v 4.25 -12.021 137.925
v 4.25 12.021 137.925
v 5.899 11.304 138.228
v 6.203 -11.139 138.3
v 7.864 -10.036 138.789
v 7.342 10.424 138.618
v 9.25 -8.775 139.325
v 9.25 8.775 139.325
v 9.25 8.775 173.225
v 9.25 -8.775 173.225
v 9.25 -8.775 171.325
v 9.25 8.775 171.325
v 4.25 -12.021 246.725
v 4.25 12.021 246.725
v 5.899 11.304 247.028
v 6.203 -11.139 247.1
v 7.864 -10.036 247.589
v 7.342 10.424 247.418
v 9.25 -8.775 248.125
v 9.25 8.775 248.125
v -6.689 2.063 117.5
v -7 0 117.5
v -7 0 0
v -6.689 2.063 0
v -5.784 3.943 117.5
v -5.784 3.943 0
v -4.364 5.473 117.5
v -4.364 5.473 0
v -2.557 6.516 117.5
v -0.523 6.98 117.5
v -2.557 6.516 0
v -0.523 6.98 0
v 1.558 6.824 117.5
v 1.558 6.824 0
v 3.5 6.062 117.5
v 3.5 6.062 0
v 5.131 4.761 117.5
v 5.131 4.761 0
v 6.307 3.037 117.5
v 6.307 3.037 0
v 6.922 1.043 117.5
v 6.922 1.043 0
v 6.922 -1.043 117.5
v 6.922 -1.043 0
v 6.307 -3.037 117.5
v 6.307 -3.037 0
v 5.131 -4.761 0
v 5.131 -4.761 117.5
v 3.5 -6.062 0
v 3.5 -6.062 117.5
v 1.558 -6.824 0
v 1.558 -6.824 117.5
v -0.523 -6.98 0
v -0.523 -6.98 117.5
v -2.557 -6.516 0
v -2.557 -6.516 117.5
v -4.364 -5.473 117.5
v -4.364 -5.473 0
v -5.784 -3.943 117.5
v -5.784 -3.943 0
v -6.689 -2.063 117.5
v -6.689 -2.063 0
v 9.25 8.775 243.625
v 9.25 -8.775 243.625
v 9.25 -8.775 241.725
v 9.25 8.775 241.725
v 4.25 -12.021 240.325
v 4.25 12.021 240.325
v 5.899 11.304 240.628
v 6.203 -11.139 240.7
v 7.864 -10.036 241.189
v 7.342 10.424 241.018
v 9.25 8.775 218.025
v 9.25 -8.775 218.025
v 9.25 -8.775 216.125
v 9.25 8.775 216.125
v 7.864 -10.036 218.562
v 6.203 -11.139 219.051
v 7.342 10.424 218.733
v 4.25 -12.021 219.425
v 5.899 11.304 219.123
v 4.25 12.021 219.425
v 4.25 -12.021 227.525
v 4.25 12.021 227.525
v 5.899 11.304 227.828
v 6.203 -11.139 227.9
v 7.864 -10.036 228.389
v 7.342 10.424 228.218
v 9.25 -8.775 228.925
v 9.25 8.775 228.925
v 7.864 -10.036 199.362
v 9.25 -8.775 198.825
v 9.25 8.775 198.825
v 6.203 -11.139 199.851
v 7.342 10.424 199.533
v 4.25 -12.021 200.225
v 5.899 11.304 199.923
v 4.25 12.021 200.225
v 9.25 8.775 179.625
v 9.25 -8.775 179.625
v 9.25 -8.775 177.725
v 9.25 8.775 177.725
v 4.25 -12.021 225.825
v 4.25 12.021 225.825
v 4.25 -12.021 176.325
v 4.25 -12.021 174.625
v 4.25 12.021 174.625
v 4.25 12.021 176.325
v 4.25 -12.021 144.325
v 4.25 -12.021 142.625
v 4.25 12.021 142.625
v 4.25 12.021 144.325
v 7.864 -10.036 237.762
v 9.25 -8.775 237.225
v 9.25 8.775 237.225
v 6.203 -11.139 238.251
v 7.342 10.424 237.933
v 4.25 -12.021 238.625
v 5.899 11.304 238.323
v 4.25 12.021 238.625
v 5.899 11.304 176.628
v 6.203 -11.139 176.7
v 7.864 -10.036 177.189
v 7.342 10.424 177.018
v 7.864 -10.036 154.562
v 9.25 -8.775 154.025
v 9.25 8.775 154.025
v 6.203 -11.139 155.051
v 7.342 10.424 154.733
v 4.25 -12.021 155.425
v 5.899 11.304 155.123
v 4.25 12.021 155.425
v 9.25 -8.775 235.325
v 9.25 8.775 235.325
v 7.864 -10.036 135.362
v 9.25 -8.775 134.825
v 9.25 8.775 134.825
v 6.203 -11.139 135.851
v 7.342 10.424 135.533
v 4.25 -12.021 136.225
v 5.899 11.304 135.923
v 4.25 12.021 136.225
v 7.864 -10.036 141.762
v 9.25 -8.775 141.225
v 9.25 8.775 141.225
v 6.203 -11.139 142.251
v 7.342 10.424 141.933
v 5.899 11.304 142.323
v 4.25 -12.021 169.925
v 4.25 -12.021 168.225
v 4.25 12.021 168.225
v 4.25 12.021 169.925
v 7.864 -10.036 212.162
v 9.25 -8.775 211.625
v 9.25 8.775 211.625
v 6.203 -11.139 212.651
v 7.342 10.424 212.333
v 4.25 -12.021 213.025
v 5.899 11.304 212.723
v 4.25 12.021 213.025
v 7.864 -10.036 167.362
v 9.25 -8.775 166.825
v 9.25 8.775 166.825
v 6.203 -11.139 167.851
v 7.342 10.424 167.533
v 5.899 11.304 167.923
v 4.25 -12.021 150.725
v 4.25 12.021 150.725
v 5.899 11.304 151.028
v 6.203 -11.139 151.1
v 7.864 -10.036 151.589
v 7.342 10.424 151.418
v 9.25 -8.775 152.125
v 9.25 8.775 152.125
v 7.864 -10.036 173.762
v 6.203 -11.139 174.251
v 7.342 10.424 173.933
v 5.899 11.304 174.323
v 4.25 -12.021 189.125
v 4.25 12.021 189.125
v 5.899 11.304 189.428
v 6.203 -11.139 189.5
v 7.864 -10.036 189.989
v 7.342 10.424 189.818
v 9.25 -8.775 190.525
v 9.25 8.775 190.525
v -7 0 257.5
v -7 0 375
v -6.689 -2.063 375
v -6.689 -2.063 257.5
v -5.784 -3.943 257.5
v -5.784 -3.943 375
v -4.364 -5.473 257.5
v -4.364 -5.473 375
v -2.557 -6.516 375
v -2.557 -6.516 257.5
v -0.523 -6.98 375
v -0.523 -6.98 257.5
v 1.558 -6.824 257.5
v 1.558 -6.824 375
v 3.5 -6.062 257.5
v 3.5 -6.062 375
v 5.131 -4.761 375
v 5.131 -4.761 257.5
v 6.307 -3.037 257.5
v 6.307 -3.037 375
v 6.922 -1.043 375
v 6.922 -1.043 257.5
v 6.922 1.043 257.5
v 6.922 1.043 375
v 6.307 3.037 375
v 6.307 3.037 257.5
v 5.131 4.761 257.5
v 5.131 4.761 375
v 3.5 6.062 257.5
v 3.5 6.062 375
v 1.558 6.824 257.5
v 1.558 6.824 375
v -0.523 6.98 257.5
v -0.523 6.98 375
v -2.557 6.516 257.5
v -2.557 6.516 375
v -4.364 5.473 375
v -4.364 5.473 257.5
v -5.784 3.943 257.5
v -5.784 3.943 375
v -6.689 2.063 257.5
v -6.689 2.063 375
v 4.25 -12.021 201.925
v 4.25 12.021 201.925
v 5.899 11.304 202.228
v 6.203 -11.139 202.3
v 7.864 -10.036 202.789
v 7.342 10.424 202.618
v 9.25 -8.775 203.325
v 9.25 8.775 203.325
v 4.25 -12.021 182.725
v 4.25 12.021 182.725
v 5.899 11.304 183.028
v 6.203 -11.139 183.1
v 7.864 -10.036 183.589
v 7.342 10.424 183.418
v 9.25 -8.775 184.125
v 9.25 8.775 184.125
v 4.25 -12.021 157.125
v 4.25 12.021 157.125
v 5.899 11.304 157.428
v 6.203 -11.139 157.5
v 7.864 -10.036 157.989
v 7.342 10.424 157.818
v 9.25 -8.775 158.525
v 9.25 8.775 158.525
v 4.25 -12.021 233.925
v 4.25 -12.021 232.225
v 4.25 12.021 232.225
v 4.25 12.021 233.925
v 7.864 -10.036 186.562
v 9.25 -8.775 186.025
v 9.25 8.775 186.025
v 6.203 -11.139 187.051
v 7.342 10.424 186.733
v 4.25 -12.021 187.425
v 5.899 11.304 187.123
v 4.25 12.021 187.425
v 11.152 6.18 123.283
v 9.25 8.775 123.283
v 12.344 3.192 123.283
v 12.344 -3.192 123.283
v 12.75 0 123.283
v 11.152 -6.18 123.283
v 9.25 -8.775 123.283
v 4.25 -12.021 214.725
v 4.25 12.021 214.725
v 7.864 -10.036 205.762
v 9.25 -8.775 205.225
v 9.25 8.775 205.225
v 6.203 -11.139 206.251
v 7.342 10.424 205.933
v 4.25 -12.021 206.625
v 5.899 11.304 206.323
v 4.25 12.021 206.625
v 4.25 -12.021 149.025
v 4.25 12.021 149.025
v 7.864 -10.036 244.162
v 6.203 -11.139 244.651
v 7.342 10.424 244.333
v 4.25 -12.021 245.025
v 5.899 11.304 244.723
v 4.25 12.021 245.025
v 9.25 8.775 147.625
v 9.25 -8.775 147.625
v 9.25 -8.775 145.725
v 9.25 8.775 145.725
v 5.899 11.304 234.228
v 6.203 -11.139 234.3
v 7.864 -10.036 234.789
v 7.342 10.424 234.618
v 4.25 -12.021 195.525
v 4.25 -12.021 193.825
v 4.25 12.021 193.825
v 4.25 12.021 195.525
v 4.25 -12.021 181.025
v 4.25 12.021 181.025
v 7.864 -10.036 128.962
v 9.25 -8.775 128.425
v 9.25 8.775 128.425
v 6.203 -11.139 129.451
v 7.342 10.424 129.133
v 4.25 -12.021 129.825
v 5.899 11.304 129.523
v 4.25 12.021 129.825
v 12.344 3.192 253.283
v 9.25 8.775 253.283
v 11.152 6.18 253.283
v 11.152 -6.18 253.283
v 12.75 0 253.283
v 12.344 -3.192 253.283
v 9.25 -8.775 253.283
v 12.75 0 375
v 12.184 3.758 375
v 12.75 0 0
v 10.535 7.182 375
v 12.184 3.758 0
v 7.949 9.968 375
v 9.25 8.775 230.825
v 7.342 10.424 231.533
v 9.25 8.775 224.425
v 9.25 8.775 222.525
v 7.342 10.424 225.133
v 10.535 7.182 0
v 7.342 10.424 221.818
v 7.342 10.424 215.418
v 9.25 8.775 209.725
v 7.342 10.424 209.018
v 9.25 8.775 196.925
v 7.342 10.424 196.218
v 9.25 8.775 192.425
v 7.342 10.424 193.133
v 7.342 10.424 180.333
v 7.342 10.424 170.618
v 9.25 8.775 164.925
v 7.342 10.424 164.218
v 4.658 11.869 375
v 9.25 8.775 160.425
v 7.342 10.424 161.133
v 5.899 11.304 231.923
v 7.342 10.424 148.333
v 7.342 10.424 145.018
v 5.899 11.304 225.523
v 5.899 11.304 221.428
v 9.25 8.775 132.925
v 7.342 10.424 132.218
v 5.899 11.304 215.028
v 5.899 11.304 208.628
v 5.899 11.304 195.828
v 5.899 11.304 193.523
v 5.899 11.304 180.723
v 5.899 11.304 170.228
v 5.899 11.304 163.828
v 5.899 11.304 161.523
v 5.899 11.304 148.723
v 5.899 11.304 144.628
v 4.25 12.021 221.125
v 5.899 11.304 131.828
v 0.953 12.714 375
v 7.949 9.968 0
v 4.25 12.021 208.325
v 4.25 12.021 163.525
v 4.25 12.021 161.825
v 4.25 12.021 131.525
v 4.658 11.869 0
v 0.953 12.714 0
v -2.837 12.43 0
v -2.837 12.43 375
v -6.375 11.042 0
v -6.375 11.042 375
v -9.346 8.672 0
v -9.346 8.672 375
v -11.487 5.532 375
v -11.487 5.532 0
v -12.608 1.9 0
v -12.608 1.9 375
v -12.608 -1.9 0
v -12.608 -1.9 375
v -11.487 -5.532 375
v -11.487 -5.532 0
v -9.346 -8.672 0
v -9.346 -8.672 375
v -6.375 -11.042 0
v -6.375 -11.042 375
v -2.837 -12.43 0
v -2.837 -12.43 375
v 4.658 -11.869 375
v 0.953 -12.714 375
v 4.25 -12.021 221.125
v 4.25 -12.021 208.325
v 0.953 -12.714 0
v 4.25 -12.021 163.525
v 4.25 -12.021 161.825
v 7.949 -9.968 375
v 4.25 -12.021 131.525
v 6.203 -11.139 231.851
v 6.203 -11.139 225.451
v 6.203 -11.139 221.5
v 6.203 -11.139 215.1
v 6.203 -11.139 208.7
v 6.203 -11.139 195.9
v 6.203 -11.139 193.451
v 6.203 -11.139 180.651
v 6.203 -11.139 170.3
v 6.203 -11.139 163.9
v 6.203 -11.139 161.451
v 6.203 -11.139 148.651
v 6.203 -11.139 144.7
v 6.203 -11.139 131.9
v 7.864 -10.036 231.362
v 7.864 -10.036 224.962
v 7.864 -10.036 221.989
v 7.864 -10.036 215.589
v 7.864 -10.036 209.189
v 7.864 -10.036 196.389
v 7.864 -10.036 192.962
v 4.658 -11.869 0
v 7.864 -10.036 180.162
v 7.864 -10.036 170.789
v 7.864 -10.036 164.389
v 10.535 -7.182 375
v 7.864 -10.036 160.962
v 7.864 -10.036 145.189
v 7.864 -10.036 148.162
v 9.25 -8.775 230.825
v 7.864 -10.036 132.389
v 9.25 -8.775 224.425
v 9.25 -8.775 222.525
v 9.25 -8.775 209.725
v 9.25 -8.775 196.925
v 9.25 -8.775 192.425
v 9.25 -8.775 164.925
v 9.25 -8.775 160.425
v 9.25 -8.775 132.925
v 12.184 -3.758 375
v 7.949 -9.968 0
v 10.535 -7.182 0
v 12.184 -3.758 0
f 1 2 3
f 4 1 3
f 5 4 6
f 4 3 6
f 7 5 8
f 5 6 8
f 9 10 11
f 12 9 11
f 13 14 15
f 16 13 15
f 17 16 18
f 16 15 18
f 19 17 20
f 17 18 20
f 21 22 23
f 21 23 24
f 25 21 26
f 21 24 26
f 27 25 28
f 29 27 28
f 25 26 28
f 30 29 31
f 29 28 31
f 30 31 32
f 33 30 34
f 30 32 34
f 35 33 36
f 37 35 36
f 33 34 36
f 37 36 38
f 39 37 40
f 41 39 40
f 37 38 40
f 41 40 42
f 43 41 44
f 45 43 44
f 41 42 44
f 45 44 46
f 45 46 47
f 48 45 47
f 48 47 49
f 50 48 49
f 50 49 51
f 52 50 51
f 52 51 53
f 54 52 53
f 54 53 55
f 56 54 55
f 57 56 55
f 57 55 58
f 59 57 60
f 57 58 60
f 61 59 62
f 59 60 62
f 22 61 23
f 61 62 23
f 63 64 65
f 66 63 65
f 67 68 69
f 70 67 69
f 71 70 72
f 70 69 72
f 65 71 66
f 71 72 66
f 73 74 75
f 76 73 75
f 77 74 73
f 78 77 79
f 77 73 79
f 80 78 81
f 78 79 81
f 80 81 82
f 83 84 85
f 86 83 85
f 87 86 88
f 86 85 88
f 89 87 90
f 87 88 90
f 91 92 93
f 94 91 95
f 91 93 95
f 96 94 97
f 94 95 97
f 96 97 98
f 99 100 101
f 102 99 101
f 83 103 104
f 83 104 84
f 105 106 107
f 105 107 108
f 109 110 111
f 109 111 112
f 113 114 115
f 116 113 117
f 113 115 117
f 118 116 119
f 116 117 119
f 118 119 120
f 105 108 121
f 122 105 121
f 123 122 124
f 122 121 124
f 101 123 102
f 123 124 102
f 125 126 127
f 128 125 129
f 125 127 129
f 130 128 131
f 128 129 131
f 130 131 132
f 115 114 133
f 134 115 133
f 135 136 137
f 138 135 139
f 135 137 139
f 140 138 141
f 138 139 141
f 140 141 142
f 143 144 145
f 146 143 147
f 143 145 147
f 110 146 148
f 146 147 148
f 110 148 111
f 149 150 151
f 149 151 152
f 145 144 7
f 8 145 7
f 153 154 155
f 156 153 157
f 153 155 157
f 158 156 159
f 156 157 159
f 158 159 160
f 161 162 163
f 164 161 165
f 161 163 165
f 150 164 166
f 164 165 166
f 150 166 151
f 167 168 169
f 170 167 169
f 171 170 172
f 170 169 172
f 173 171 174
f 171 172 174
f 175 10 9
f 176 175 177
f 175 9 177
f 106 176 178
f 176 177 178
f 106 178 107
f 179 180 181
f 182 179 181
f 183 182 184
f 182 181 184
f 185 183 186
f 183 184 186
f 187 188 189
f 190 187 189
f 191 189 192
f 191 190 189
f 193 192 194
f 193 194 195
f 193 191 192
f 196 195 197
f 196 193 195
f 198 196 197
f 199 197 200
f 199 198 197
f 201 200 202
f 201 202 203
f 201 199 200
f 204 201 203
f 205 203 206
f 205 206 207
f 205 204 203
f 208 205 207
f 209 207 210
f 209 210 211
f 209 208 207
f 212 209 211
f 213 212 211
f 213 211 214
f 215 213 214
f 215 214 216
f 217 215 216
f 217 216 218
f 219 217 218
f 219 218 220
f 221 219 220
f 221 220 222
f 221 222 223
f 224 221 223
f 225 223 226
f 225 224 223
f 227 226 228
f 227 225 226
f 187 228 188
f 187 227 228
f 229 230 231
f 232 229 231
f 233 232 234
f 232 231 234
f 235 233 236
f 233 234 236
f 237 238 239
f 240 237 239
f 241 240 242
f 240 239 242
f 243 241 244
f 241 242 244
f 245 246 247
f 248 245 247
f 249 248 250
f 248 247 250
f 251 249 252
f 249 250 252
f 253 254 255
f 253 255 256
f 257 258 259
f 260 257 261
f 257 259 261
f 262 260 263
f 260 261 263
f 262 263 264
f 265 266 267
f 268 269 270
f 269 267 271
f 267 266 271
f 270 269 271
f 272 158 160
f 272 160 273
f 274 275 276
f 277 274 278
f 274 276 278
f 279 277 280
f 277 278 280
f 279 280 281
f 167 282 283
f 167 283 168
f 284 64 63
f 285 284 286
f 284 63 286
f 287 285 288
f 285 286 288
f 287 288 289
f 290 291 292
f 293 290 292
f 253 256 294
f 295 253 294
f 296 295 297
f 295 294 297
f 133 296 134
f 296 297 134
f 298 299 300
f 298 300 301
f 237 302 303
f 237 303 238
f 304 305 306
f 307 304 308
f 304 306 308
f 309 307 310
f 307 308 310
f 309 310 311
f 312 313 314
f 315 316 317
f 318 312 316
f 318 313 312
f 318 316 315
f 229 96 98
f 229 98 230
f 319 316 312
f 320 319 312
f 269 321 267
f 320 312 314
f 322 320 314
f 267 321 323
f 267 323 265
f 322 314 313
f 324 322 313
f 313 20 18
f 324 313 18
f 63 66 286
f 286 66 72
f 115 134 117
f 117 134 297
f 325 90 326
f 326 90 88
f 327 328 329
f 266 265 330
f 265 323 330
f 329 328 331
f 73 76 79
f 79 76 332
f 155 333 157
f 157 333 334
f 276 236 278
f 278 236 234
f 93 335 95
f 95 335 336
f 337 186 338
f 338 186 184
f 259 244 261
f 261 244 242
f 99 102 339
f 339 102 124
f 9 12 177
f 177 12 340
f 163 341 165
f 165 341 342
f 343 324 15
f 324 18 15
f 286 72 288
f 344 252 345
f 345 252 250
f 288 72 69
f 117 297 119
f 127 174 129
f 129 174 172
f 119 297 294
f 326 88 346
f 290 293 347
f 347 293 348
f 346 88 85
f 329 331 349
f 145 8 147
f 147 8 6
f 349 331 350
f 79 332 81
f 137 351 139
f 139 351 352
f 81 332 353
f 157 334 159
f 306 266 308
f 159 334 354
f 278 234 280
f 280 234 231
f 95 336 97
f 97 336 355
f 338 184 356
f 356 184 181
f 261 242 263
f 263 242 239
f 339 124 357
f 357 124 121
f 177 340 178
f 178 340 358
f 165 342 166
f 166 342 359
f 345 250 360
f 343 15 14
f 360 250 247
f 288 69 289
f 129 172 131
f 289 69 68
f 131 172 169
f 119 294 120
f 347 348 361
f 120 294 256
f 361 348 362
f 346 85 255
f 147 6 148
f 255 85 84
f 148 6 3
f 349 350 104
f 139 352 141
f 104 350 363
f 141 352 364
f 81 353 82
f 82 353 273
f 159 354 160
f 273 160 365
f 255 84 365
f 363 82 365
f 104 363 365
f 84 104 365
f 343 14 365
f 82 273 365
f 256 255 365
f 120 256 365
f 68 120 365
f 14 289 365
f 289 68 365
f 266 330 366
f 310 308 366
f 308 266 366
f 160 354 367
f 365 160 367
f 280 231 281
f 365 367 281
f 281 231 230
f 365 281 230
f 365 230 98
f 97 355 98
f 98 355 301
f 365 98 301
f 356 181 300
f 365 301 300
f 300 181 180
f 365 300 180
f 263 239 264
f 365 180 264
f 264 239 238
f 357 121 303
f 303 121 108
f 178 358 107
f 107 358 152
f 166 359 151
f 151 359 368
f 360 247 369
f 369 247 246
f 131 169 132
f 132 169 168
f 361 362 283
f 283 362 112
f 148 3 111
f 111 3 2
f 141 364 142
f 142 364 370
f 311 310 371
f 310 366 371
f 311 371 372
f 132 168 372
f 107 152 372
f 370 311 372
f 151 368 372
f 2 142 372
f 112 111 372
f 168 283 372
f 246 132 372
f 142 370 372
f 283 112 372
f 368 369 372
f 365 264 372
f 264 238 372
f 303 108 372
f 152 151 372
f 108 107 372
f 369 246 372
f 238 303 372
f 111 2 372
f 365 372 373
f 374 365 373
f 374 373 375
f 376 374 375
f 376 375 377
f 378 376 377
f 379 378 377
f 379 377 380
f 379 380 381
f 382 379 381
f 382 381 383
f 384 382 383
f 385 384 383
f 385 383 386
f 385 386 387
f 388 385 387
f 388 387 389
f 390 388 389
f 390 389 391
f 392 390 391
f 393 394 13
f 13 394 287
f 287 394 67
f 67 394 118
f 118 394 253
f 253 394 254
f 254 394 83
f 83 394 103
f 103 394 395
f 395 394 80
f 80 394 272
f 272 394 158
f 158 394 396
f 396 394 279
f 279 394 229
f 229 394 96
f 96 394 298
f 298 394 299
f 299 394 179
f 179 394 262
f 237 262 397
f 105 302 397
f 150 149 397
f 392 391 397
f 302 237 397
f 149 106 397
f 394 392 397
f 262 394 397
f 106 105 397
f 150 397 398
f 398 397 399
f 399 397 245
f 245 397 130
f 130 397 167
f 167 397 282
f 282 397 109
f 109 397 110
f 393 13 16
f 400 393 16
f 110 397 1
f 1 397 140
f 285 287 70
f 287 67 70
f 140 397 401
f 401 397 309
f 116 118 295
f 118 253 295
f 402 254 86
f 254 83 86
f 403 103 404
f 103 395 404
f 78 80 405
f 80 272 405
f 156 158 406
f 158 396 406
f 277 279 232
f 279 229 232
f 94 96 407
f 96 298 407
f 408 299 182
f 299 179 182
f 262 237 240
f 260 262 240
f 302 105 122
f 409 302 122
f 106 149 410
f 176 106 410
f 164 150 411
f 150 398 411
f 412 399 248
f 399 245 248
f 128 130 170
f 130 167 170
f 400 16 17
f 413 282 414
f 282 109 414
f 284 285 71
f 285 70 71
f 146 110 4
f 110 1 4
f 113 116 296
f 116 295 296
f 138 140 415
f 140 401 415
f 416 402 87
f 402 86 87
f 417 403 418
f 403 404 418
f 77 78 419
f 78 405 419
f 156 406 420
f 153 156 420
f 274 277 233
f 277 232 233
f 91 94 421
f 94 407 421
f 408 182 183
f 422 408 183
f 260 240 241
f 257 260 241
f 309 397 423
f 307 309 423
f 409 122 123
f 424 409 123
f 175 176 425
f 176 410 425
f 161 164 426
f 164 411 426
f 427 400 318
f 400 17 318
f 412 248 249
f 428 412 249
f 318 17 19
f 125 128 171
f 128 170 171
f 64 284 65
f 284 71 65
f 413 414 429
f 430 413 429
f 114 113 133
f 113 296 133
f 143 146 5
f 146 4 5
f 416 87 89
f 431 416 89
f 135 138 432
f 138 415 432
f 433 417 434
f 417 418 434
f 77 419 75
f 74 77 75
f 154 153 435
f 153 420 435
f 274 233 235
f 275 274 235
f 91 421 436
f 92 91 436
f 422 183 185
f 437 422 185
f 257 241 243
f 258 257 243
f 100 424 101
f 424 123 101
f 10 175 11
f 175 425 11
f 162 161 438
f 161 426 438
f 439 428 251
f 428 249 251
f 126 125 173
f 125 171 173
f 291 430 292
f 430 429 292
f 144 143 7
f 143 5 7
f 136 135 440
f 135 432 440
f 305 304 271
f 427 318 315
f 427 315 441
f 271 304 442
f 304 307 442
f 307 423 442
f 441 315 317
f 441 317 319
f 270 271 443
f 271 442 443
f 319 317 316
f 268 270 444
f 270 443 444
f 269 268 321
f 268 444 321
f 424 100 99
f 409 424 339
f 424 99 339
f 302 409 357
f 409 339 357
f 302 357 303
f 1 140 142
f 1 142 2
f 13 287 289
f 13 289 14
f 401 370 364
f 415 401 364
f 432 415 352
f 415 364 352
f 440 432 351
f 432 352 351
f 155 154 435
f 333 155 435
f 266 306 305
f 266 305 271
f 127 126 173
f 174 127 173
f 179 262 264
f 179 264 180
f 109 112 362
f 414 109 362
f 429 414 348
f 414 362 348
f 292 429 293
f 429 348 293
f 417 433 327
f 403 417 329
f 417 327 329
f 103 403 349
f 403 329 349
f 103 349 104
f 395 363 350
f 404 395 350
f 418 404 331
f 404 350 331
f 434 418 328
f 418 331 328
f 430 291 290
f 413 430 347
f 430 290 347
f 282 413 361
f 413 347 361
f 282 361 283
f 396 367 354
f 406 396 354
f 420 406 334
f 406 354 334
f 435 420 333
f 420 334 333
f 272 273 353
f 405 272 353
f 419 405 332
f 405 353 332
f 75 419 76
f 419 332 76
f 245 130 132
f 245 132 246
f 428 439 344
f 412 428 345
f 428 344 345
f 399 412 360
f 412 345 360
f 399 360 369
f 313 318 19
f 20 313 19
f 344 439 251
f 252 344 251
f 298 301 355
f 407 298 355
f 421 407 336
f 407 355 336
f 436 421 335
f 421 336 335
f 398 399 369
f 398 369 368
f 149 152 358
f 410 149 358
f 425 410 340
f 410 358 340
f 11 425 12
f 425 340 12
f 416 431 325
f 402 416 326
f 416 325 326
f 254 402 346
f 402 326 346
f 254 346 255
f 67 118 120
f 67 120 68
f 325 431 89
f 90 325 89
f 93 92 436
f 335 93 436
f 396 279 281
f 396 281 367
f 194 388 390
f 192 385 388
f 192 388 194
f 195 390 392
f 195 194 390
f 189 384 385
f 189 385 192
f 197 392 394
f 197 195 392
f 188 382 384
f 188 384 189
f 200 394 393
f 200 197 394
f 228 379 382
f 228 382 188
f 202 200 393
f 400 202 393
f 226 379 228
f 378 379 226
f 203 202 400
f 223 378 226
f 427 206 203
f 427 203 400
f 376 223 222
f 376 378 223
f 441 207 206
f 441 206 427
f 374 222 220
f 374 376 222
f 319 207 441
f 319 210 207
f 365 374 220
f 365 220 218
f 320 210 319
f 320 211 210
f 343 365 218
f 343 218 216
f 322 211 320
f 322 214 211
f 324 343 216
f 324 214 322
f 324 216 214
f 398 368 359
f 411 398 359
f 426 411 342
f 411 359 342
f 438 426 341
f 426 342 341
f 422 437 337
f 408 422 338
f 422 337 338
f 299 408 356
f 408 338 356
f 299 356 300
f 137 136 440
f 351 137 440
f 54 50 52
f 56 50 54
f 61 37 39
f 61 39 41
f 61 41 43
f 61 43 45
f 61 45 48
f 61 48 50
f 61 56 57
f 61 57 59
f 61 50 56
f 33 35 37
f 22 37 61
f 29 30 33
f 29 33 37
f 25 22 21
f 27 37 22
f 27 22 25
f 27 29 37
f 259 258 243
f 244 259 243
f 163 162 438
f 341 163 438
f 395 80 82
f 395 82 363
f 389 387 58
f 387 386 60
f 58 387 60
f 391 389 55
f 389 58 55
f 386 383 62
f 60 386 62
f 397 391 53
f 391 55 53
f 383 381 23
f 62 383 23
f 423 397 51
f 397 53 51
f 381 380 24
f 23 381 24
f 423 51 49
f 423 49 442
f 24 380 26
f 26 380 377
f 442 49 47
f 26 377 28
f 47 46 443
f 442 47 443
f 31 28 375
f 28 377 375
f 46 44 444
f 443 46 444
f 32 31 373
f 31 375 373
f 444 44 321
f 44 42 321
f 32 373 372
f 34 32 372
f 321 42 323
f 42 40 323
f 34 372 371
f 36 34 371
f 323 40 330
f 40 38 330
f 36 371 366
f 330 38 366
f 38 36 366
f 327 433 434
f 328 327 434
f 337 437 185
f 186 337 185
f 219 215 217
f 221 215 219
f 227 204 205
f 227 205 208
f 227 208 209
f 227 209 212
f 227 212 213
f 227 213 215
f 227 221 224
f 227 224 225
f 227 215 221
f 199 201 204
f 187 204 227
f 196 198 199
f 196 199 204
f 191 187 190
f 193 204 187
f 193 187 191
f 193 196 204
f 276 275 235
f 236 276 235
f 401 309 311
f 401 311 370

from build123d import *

# Parameters (mm, degrees)
SKETCH1_R               = 12.75
BOSS_EXTRUDE1_DEPTH     = 375
CUT_EXTRUDE1_DEPTH      = 40
CUT_EXTRUDE1_DEPTH_BACK = 45
SKETCH2_W               = 3.5
SKETCH2_H               = 130
CUT_EXTRUDE2_DEPTH      = 45
LPATTERN1_COUNT         = 10
LPATTERN1_PITCH         = 6.4
LPATTERN1_COUNT_DIR2    = 10
LPATTERN1_PITCH_DIR2    = 6.4
SKETCH4_R               = 7
CUT_EXTRUDE3_DEPTH      = 117.5
CUT_EXTRUDE4_START      = -117.5
SKETCH5_R               = 7
CUT_EXTRUDE4_DEPTH      = 117.5


with BuildPart() as part:
    # Sketch1 → Boss-Extrude1 (new body)
    with BuildSketch(Plane.XY):
        Circle(SKETCH1_R)
    extrude(amount=BOSS_EXTRUDE1_DEPTH)

    # Sketch2 → Cut-Extrude1 (cut, two sides: drawn at the far end of the back side and taken through both)
    with BuildSketch(Plane(origin=(0, 0, 0), x_dir=(1, 0, 0), z_dir=(0, 1, 0)).offset(-CUT_EXTRUDE1_DEPTH_BACK)):
        with Locations((11, -188.282678405)):
            Rectangle(SKETCH2_W, SKETCH2_H)
    extrude(amount=CUT_EXTRUDE1_DEPTH + CUT_EXTRUDE1_DEPTH_BACK, mode=Mode.SUBTRACT)

    # Sketch3 → Cut-Extrude2 (cut, symmetric)
    with BuildSketch(Plane(origin=(0, 0, 0), x_dir=(1, 0, 0), z_dir=(0, 1, 0))):
        with BuildLine():
            Line((9.25, -190.525417834), (9.25, -186.025417834))
            ThreePointArc((9.25, -186.025417834), (6.797301158, -186.894350543), (4.25, -187.425417834))
            Line((4.25, -187.425417834), (4.25, -189.125417834))
            ThreePointArc((4.25, -189.125417834), (6.797301158, -189.656485126), (9.25, -190.525417834))
        make_face()
    cut_extrude2 = extrude(amount=CUT_EXTRUDE2_DEPTH, both=True, mode=Mode.SUBTRACT)

    # LPattern1: Cut-Extrude2 10 × 10
    with Locations(*[Vector(0, 0, 1) * (i * LPATTERN1_PITCH) + Vector(0, 0, -1) * (j * LPATTERN1_PITCH_DIR2) for i in range(LPATTERN1_COUNT) for j in range(LPATTERN1_COUNT_DIR2) if (i, j) != (0, 0)]):
        add(cut_extrude2, mode=Mode.SUBTRACT)

    # Sketch4 → Cut-Extrude3 (cut)
    with BuildSketch(Plane(origin=(0, 0, 0), x_dir=(-1, 0, 0), z_dir=(0, 0, -1))):
        Circle(SKETCH4_R)
    extrude(amount=-CUT_EXTRUDE3_DEPTH, mode=Mode.SUBTRACT)

    # Sketch5 → Cut-Extrude4 (cut)
    with BuildSketch(Plane.XY.offset(375).offset(CUT_EXTRUDE4_START)):
        Circle(SKETCH5_R)
    extrude(amount=CUT_EXTRUDE4_DEPTH, mode=Mode.SUBTRACT)


solid = part.part
